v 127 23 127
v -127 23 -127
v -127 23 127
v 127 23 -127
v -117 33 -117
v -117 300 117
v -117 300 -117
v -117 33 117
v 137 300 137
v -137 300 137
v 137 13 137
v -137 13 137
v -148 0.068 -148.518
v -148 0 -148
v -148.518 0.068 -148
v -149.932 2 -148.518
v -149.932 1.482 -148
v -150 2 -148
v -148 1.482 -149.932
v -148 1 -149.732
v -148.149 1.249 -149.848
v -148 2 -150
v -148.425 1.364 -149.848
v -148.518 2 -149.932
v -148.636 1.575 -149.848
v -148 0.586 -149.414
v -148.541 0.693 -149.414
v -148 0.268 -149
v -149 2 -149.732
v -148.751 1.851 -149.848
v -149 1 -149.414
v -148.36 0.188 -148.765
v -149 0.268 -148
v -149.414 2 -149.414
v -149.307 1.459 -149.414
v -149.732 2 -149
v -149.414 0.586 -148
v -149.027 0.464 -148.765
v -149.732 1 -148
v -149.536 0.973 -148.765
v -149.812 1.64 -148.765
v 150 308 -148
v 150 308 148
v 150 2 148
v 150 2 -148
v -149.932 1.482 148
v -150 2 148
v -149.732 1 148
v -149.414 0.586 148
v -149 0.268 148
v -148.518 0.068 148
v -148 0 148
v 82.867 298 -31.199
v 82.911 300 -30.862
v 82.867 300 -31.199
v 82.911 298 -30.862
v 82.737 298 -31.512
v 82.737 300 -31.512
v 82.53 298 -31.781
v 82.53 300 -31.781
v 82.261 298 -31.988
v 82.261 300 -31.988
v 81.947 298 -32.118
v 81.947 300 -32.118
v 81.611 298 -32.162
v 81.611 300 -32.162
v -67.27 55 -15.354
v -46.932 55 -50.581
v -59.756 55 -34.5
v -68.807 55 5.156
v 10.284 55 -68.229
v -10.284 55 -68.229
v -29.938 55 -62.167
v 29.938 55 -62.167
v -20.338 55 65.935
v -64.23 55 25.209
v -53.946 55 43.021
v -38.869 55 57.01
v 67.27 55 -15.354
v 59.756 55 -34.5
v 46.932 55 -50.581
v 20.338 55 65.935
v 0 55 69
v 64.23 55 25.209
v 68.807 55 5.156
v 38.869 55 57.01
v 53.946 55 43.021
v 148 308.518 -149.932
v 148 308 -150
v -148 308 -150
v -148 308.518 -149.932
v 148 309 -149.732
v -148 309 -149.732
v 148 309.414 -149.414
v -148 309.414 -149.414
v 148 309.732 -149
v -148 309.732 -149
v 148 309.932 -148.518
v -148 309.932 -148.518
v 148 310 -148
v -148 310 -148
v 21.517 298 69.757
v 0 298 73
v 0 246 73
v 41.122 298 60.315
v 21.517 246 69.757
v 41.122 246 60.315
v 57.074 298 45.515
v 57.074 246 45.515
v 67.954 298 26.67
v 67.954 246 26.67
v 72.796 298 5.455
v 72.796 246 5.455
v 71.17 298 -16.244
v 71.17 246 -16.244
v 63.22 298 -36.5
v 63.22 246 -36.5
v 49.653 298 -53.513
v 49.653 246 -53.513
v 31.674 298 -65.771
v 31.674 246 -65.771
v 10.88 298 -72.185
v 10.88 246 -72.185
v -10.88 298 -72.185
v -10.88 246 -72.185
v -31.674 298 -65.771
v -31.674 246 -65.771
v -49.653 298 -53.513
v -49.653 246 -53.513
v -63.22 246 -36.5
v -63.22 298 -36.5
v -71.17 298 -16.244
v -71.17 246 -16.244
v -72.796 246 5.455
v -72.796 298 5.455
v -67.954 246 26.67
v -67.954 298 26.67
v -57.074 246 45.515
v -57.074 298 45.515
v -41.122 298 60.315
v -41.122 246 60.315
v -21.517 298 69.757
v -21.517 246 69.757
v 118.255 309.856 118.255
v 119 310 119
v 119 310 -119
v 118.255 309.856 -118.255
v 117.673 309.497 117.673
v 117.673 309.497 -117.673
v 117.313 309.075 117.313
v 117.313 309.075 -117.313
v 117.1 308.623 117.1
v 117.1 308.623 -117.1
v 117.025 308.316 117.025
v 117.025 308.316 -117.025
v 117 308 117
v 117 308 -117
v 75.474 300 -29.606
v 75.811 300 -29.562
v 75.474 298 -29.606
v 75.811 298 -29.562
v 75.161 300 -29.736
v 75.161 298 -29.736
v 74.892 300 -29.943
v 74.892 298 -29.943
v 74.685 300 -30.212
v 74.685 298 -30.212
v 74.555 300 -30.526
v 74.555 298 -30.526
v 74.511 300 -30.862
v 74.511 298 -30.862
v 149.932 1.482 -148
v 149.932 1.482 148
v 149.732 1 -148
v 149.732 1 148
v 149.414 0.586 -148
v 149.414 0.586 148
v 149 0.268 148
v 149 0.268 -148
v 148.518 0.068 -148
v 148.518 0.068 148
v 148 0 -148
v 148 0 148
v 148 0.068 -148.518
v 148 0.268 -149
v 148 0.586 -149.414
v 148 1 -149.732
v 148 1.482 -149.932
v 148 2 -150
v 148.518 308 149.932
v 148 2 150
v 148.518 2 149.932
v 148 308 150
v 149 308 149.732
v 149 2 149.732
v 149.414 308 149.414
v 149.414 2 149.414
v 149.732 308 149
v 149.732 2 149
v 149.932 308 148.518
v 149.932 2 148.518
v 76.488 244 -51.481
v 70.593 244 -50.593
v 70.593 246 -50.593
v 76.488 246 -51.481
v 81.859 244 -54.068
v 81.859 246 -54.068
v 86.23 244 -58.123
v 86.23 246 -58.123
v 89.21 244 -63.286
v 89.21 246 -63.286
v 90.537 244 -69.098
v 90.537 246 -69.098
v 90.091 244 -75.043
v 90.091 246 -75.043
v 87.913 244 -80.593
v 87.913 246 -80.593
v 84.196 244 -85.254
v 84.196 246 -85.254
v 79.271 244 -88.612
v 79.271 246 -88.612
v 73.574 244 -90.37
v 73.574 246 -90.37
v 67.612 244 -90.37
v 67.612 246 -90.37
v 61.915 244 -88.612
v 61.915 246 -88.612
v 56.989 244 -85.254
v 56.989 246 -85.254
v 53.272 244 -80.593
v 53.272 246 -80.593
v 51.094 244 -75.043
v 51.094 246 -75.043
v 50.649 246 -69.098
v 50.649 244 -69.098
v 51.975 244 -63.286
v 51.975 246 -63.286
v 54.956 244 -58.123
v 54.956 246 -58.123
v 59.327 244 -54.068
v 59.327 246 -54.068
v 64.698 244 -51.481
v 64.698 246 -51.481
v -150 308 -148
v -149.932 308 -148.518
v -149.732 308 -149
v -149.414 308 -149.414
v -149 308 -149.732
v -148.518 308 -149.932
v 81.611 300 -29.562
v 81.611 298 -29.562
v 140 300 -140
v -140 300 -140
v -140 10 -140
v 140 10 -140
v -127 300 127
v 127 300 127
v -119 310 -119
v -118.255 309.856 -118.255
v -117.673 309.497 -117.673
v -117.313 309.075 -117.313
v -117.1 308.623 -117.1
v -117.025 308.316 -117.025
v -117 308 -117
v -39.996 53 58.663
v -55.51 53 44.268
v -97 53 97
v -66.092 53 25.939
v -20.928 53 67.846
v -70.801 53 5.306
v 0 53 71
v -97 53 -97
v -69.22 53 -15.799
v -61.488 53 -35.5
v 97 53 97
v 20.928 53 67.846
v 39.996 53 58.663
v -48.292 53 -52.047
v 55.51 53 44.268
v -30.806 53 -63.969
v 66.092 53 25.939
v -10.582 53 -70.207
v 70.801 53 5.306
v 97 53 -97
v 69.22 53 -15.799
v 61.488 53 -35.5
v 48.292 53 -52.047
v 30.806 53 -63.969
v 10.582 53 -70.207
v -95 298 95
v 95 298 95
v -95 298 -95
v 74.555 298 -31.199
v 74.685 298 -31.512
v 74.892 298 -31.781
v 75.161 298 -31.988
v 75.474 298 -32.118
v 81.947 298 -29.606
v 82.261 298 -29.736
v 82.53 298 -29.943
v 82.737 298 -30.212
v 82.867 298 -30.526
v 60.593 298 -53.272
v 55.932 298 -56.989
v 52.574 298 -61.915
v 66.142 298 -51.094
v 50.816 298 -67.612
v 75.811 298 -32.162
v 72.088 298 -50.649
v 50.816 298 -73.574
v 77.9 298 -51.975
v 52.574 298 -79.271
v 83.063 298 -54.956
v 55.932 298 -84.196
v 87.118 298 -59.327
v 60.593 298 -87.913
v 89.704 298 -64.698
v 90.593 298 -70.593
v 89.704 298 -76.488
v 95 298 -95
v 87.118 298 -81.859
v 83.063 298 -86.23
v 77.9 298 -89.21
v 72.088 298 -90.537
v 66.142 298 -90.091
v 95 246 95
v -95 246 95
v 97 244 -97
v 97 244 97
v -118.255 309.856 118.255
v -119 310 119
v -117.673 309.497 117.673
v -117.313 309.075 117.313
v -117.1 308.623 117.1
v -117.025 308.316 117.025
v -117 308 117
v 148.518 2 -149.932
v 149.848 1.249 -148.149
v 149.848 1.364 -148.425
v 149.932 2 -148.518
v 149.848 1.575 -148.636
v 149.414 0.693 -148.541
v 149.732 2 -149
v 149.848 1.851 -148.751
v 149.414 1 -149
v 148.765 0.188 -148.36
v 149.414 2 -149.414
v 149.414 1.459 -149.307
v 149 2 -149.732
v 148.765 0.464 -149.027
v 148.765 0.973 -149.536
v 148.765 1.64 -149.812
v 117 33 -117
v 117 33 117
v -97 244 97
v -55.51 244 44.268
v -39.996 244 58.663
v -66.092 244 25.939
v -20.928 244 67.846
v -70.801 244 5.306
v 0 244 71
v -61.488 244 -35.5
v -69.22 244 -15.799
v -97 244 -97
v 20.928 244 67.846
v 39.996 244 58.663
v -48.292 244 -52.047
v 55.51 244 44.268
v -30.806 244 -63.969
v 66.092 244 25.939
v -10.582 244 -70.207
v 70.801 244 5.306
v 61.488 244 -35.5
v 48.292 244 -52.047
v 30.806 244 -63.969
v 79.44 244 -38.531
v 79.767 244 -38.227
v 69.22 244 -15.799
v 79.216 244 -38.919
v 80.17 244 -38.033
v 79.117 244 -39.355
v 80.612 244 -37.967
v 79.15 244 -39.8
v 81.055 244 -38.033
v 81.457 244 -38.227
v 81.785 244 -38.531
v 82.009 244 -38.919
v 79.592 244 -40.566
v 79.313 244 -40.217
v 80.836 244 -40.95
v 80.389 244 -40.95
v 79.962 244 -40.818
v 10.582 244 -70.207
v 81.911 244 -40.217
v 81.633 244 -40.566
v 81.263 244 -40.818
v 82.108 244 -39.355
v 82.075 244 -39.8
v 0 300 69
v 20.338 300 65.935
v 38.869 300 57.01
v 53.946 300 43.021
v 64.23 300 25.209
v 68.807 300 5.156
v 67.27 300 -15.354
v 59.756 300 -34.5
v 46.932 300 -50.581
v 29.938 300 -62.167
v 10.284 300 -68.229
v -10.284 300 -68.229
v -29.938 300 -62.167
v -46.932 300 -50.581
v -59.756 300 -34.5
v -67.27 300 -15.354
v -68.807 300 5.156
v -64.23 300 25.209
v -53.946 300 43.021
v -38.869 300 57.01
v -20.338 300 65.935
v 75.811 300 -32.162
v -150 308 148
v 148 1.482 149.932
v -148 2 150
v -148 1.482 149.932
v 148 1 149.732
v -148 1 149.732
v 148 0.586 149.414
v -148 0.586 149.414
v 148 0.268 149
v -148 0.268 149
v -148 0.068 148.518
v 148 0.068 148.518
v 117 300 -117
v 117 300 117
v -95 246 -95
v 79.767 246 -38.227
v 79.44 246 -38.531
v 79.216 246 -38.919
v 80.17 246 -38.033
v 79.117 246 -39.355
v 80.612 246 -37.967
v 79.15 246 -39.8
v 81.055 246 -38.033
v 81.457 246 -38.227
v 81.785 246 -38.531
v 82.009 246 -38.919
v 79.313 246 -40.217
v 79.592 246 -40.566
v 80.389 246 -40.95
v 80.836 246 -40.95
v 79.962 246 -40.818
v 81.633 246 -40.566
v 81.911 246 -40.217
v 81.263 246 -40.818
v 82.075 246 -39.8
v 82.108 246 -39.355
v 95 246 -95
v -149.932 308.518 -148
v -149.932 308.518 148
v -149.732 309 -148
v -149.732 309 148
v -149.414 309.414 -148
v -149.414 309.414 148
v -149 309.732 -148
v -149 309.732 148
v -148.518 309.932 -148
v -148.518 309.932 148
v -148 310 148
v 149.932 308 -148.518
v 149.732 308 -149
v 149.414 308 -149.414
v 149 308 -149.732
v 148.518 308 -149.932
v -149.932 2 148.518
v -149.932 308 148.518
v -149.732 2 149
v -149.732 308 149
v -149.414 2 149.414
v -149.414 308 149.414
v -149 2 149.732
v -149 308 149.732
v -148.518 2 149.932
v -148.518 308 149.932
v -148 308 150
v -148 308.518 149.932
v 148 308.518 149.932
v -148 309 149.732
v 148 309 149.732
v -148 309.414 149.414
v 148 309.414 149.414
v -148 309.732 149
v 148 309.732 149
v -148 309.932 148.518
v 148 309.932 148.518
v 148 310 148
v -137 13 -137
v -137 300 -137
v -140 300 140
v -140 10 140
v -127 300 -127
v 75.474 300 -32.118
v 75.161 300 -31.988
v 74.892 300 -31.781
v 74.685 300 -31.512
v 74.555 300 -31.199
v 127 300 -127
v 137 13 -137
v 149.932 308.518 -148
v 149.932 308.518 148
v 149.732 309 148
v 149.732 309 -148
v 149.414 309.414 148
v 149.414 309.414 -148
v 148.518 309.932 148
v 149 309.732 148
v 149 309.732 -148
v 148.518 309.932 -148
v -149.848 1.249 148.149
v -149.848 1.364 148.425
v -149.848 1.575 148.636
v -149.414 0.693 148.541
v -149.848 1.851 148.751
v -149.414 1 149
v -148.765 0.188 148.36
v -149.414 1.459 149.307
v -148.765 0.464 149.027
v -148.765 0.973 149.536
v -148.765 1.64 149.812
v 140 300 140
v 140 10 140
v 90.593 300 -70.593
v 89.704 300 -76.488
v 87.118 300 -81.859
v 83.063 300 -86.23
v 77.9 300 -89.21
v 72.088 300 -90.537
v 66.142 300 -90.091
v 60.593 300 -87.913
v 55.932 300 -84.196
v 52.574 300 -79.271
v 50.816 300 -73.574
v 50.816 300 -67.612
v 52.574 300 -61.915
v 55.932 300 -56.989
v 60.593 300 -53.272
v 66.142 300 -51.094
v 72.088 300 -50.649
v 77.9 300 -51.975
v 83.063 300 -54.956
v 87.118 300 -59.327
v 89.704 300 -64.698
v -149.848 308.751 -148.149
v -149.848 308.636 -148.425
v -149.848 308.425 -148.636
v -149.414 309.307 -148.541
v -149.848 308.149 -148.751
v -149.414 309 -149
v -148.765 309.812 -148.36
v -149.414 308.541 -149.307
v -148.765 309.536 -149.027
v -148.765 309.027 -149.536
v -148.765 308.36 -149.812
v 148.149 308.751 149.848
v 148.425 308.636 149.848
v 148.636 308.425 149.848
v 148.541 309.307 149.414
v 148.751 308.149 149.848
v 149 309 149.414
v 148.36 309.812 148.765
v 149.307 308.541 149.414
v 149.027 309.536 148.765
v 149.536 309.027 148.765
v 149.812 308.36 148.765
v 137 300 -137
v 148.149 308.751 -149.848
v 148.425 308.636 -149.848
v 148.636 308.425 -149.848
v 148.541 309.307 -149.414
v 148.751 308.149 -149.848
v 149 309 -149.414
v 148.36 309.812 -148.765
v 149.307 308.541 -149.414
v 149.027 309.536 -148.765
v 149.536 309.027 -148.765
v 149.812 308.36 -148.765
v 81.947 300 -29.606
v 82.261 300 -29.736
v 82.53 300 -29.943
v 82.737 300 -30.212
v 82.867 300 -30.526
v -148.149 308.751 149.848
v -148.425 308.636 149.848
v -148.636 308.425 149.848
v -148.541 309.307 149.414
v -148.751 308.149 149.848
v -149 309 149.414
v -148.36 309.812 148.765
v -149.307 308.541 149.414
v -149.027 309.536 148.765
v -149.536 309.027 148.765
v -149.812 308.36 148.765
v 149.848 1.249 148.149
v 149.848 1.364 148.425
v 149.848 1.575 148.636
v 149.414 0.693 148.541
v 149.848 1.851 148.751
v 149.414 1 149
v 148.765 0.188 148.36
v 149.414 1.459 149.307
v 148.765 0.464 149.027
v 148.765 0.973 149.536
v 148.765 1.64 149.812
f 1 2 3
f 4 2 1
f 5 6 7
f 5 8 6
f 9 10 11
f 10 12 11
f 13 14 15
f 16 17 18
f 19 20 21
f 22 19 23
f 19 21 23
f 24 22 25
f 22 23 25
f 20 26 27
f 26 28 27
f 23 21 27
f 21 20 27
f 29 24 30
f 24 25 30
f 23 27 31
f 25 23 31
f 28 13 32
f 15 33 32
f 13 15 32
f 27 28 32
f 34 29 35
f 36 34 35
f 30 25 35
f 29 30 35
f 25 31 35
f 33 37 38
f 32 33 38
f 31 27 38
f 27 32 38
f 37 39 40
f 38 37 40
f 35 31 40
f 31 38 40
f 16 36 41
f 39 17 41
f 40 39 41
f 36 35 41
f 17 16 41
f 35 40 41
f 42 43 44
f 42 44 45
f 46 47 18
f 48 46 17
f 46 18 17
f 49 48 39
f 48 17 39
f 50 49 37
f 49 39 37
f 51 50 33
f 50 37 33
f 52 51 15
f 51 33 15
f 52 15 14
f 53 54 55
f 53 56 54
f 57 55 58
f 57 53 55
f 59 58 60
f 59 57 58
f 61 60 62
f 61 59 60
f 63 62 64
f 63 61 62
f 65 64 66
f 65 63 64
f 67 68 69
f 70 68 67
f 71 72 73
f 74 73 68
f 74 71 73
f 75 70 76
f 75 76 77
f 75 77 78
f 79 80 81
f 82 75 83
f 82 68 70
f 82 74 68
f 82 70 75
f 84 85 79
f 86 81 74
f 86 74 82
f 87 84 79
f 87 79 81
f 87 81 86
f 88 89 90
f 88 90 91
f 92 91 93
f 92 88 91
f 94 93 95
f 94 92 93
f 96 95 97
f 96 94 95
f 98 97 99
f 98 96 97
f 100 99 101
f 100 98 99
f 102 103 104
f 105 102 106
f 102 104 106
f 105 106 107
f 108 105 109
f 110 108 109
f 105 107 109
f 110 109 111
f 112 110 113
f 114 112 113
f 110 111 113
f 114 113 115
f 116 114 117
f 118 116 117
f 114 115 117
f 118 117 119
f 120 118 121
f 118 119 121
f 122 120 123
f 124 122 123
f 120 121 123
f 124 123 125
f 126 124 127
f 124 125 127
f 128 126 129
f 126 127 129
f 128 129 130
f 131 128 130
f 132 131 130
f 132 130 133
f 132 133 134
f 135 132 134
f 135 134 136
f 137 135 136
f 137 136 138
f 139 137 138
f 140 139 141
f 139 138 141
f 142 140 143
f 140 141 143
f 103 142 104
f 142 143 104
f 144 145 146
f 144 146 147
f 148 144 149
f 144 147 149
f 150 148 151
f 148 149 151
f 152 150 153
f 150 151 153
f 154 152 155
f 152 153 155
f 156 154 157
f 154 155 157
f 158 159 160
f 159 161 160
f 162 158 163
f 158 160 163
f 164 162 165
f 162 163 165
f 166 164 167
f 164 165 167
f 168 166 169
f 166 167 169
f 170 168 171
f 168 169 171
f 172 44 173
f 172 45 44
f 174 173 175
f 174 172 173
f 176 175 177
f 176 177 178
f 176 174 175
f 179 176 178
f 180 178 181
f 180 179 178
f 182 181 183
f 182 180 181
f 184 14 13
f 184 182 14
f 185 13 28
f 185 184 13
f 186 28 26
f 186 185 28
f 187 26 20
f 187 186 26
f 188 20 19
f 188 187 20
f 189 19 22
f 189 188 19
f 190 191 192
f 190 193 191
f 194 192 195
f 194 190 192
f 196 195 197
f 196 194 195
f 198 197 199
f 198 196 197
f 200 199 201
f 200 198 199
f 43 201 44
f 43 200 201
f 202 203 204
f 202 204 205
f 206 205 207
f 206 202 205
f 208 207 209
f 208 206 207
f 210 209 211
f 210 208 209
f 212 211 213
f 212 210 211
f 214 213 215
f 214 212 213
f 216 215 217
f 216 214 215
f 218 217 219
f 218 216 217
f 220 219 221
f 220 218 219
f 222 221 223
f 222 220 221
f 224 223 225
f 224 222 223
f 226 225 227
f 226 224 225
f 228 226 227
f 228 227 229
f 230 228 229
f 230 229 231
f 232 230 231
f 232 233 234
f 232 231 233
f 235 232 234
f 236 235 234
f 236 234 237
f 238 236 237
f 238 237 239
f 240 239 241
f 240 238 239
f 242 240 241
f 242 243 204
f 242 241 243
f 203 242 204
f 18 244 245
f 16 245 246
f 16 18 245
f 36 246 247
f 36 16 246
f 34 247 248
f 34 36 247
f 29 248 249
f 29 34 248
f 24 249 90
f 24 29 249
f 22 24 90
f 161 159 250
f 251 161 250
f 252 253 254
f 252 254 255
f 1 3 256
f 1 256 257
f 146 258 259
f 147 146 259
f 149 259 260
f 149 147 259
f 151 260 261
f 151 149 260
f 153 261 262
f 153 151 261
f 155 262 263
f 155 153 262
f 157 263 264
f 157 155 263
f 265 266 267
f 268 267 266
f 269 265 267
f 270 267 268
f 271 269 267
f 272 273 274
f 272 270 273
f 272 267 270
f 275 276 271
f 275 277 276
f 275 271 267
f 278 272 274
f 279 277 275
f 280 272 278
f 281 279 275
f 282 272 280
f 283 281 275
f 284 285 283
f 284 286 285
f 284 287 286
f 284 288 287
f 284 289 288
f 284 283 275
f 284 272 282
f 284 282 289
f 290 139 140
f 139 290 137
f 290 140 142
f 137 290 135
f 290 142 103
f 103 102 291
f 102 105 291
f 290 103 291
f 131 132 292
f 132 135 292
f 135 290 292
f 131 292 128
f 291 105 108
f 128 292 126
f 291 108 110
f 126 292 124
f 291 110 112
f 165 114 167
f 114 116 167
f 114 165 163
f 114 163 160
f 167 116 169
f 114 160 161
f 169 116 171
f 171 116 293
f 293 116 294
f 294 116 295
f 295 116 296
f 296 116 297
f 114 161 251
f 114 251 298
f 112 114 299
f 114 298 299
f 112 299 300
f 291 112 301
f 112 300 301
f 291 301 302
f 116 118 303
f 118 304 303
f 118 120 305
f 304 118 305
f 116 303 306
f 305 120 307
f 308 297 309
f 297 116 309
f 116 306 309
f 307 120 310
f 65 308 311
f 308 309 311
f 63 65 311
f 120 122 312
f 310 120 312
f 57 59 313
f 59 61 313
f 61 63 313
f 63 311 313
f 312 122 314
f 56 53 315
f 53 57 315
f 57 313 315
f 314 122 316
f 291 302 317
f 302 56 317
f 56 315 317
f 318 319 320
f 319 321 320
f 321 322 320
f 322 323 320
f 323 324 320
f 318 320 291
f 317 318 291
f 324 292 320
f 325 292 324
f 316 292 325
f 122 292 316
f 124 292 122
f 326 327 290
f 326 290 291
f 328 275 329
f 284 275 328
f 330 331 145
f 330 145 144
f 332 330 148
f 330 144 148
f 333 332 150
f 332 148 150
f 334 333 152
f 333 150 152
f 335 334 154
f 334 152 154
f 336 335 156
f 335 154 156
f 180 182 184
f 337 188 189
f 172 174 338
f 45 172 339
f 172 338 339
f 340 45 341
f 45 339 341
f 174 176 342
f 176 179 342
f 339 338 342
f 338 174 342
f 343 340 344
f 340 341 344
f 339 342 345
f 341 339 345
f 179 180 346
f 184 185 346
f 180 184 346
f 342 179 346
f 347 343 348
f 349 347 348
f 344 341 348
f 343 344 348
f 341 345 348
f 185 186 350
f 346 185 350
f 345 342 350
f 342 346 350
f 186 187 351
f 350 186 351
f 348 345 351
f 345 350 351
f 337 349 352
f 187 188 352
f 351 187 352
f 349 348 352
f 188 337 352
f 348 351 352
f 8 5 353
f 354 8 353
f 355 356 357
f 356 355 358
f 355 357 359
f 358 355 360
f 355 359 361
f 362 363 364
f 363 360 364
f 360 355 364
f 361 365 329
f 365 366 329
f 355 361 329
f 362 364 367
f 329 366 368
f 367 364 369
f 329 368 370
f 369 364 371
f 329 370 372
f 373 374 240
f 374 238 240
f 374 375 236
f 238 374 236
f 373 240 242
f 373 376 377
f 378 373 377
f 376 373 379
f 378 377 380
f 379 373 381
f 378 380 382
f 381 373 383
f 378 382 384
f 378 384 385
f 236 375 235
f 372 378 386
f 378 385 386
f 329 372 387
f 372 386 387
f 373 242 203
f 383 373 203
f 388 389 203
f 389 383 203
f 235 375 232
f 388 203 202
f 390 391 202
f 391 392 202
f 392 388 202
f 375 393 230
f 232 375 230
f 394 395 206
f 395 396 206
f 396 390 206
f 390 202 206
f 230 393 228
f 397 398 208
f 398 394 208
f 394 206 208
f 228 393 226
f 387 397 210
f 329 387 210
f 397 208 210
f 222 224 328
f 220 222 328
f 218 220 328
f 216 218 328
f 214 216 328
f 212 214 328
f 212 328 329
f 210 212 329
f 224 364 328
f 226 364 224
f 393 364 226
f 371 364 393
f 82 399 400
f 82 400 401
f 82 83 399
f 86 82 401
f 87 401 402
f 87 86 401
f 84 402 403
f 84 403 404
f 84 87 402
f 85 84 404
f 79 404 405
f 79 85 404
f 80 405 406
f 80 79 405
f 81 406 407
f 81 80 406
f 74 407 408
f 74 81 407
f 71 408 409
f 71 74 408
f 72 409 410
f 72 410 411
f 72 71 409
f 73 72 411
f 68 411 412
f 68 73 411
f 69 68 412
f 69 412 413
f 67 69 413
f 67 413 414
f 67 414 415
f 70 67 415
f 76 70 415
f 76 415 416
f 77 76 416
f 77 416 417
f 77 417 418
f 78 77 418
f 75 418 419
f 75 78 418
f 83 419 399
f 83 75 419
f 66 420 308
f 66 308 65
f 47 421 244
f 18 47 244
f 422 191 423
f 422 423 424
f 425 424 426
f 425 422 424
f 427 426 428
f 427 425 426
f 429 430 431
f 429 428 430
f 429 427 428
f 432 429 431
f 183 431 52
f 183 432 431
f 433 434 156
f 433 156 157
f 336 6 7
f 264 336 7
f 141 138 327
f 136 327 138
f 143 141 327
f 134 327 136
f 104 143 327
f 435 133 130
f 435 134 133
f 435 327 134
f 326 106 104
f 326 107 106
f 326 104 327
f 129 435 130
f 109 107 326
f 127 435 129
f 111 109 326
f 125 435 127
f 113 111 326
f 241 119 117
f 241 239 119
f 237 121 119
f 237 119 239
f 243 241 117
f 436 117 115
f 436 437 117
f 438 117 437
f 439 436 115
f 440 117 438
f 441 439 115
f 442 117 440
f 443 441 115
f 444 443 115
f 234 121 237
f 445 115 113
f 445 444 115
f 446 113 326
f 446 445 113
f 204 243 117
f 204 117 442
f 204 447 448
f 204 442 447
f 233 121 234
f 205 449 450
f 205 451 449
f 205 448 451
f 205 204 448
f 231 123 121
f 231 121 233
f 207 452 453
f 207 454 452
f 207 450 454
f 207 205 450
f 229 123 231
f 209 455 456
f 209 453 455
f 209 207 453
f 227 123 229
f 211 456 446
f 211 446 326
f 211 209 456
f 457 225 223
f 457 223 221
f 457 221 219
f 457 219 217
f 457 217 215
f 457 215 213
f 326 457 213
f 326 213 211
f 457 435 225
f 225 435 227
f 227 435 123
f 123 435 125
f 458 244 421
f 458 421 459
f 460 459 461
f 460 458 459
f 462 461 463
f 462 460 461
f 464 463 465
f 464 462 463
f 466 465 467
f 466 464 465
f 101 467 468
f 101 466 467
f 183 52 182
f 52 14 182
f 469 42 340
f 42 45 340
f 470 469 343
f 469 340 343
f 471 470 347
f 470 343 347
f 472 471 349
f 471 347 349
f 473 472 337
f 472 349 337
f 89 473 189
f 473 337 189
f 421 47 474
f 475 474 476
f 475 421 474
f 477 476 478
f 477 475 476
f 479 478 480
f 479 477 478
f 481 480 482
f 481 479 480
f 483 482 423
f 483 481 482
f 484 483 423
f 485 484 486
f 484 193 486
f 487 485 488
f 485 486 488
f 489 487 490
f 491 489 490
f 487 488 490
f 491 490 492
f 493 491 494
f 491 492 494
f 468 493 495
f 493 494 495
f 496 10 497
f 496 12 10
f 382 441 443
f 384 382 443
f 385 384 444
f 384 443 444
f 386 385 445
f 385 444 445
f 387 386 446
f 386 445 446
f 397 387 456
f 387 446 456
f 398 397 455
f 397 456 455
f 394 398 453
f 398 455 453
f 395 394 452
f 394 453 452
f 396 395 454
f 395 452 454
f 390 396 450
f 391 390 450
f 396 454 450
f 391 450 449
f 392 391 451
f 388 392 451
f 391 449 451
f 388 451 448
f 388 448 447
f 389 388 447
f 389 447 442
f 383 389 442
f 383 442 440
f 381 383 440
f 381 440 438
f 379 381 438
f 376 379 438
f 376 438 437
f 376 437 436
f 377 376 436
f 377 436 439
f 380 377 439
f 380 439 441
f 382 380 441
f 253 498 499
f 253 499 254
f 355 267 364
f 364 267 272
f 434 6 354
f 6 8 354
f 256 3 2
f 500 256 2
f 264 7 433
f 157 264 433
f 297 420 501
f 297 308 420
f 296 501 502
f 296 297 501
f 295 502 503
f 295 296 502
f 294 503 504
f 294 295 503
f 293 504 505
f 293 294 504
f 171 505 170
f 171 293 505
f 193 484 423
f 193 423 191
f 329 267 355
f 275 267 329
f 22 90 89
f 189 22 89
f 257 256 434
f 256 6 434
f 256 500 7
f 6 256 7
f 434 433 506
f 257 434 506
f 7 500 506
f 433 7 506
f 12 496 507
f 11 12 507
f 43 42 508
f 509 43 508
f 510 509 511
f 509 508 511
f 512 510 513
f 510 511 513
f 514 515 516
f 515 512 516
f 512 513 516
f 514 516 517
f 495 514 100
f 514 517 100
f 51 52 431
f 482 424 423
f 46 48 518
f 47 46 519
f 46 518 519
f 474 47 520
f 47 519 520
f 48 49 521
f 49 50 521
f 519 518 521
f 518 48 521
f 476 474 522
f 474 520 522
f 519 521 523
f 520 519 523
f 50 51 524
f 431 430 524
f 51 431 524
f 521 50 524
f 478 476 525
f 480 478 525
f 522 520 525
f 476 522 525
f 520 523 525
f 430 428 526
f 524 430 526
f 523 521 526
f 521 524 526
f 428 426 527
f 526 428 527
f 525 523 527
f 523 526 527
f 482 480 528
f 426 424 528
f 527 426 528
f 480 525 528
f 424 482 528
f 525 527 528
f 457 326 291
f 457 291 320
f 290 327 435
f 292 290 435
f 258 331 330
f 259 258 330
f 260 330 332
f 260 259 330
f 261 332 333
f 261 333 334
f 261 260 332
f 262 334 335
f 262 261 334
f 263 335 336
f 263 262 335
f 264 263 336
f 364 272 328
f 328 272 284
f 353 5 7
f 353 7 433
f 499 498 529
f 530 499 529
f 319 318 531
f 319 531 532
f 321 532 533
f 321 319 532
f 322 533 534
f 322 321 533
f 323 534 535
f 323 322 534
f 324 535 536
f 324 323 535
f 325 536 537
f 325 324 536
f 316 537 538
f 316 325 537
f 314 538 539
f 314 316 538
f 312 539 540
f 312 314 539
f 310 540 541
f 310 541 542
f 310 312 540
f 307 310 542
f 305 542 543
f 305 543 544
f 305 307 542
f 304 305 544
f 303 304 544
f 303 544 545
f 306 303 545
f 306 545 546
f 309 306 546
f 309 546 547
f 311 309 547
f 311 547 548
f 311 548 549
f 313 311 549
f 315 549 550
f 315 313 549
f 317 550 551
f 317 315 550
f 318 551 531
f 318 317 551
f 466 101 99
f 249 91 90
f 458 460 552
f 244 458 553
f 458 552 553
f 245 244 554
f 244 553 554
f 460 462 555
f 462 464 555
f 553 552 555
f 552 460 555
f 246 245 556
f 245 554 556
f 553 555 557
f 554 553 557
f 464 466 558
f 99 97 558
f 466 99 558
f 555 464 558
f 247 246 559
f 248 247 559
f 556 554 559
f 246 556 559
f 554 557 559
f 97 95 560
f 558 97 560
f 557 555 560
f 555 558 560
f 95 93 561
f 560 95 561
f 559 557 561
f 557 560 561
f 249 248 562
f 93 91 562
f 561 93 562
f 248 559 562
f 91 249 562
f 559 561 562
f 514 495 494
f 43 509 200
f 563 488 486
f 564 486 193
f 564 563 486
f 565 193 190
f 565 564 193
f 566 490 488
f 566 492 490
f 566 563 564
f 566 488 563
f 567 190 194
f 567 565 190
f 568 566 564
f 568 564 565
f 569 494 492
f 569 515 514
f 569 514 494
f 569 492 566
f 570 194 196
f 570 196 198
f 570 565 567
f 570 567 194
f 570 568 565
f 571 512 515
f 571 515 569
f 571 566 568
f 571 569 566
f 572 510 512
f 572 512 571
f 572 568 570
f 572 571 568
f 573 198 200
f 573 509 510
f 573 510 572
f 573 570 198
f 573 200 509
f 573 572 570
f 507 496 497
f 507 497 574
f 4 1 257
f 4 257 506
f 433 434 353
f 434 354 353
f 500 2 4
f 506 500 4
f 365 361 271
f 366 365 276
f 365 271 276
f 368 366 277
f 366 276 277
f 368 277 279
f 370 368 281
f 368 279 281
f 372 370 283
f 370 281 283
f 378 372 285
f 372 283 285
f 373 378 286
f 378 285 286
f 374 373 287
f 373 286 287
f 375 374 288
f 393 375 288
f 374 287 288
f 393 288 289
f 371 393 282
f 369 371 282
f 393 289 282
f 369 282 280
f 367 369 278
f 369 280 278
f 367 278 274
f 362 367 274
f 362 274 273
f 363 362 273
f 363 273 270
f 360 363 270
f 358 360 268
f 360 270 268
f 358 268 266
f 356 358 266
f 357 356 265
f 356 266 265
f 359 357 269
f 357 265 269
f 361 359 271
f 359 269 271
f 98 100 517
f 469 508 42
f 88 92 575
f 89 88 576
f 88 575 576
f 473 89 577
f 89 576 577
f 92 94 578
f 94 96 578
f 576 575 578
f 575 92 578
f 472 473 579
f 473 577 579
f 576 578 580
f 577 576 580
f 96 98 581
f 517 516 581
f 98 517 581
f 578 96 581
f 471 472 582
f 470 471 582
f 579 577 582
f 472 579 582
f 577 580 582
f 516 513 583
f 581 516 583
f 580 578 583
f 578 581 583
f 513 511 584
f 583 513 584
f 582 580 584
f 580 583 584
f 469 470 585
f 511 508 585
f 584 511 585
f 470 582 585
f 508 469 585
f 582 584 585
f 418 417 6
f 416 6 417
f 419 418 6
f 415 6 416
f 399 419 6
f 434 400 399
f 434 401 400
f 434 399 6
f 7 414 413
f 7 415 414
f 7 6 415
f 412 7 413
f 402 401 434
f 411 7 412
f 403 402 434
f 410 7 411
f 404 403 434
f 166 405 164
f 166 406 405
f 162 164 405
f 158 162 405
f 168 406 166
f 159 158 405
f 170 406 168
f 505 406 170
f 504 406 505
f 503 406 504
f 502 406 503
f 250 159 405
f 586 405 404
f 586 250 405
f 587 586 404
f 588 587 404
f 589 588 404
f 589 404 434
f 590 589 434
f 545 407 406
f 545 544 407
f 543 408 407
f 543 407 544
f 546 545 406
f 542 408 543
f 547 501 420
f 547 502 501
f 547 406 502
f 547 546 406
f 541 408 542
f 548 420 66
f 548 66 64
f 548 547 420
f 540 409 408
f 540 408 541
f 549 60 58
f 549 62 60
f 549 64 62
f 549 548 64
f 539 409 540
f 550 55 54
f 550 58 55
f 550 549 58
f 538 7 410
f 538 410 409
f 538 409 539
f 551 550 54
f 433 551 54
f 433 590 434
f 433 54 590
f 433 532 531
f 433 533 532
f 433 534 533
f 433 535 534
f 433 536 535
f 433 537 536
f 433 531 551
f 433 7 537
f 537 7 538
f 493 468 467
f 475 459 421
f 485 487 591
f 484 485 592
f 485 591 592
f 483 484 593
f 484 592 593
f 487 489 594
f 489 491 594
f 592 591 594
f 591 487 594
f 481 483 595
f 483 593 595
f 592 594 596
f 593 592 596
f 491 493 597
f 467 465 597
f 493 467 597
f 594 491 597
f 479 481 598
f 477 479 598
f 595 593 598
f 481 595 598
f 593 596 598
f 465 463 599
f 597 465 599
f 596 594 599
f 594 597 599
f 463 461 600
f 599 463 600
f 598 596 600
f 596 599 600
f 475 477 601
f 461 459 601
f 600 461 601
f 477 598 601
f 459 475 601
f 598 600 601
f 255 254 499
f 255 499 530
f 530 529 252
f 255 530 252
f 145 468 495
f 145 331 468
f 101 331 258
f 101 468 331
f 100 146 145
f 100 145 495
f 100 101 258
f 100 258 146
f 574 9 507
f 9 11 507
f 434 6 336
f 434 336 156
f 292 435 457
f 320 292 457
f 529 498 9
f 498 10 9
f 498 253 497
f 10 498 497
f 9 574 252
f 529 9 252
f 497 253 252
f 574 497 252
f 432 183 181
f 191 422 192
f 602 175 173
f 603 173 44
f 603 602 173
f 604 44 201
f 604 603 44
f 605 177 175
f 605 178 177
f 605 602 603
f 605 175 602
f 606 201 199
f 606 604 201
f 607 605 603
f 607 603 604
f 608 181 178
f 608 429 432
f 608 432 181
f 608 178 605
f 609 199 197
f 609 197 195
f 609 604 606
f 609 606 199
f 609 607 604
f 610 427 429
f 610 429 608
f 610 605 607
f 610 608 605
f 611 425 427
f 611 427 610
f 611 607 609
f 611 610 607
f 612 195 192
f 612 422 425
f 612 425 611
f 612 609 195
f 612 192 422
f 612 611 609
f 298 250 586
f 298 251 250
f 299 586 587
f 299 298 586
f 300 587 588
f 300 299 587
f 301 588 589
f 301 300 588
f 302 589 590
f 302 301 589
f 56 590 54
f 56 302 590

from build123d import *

# Parameters (mm, degrees)
SKETCH2_W               = 300
SKETCH2_H               = 300
BOSS_EXTRUDE1_DEPTH     = 10
SKETCH3_W               = 300
SKETCH3_H               = 300
SKETCH3_W_2             = 280
SKETCH3_H_2             = 280
BOSS_EXTRUDE2_DEPTH     = 290
SKETCH4_W               = 274
SKETCH4_H               = 274
BOSS_EXTRUDE3_DEPTH     = 10
SKETCH5_W               = 274
SKETCH5_H               = 274
SKETCH5_W_2             = 254
SKETCH5_H_2             = 254
BOSS_EXTRUDE4_DEPTH     = 277
SKETCH6_W               = 234
SKETCH6_H               = 234
BOSS_EXTRUDE5_DEPTH     = 20
SKETCH7_W               = 234
SKETCH7_H               = 234
SKETCH7_W_2             = 194
SKETCH7_H_2             = 194
BOSS_EXTRUDE6_DEPTH     = 247
SKETCH8_R               = 71
BOSS_EXTRUDE7_DEPTH     = 2
SKETCH9_R               = 71
SKETCH9_R_2             = 69
BOSS_EXTRUDE8_DEPTH     = 245
SKETCH10_W              = 194
SKETCH10_H              = 194
SKETCH10_R              = 71
BOSS_EXTRUDE9_DEPTH     = 2
SKETCH11_W              = 194
SKETCH11_H              = 194
SKETCH11_W_2            = 190
SKETCH11_H_2            = 190
BOSS_EXTRUDE11_DEPTH    = 52
CUT_EXTRUDE1_DEPTH      = 200
CUT_EXTRUDE1_DEPTH_BACK = 52
SKETCH12_R              = 20
SKETCH16_R              = 73
SKETCH16_R_2            = 71
BOSS_EXTRUDE14_DEPTH    = 52
SKETCH17_W              = 194
SKETCH17_H              = 194
SKETCH17_R              = 69
BOSS_EXTRUDE15_DEPTH    = 2
SKETCH18_W              = 300
SKETCH18_H              = 300
SKETCH18_W_2            = 234
SKETCH18_H_2            = 234
BOSS_EXTRUDE16_DEPTH    = 10
FILLET1_R               = 2
CUT_EXTRUDE6_START      = 298
CUT_EXTRUDE6_OUTLINE_R  = 20
CUT_EXTRUDE6_DEPTH      = 2
SKETCH21_R              = 1.5
CUT_EXTRUDE7_DEPTH      = 10
SKETCH22_W              = 8.4
SKETCH22_H              = 2.6
CUT_EXTRUDE8_DEPTH      = 10
FILLET2_R               = 1.3


# Read off the part's stored shape, not the designer's step: Cut-Extrude6
with BuildPart() as part:
    # Sketch2 → Boss-Extrude1 (new body)
    with BuildSketch(Plane(origin=(0, 0, 0), x_dir=(1, 0, 0), z_dir=(0, 1, 0))):
        Rectangle(SKETCH2_W, SKETCH2_H)
    extrude(amount=BOSS_EXTRUDE1_DEPTH)

    # Sketch3 → Boss-Extrude2 (add)
    with BuildSketch(Plane(origin=(0, 10, 0), x_dir=(1, 0, 0), z_dir=(0, 1, 0))):
        Rectangle(SKETCH3_W, SKETCH3_H)
        Rectangle(SKETCH3_W_2, SKETCH3_H_2, mode=Mode.SUBTRACT)
    extrude(amount=BOSS_EXTRUDE2_DEPTH)



with BuildPart() as body_2:
    # Sketch4 → Boss-Extrude3 (new body)
    with BuildSketch(Plane(origin=(0, 13, 0), x_dir=(1, 0, 0), z_dir=(0, 1, 0))):
        Rectangle(SKETCH4_W, SKETCH4_H)
    extrude(amount=BOSS_EXTRUDE3_DEPTH)

    # Sketch5 → Boss-Extrude4 (add)
    with BuildSketch(Plane(origin=(0, 23, 0), x_dir=(1, 0, 0), z_dir=(0, 1, 0))):
        Rectangle(SKETCH5_W, SKETCH5_H)
        Rectangle(SKETCH5_W_2, SKETCH5_H_2, mode=Mode.SUBTRACT)
    extrude(amount=BOSS_EXTRUDE4_DEPTH)


with BuildPart() as body_3:
    # Sketch6 → Boss-Extrude5 (new body)
    with BuildSketch(Plane(origin=(0, 33, 0), x_dir=(1, 0, 0), z_dir=(0, 1, 0))):
        Rectangle(SKETCH6_W, SKETCH6_H)
    extrude(amount=BOSS_EXTRUDE5_DEPTH)

    # Sketch7 → Boss-Extrude6 (add)
    with BuildSketch(Plane(origin=(0, 53, 0), x_dir=(1, 0, 0), z_dir=(0, 1, 0))):
        Rectangle(SKETCH7_W, SKETCH7_H)
        Rectangle(SKETCH7_W_2, SKETCH7_H_2, mode=Mode.SUBTRACT)
    extrude(amount=BOSS_EXTRUDE6_DEPTH)

    # Sketch8 → Boss-Extrude7 (add)
    with BuildSketch(Plane(origin=(0, 53, 0), x_dir=(1, 0, 0), z_dir=(0, 1, 0))):
        with Locations(Location((0, 0, 0), (0, 0, 270))):
            Circle(SKETCH8_R)
    extrude(amount=BOSS_EXTRUDE7_DEPTH)

    # Sketch9 → Boss-Extrude8 (add)
    with BuildSketch(Plane(origin=(0, 55, 0), x_dir=(1, 0, 0), z_dir=(0, 1, 0))):
        with Locations(Location((0, 0, 0), (0, 0, 270))):
            Circle(SKETCH9_R)
        with Locations(Location((0, 0, 0), (0, 0, 270))):
            Circle(SKETCH9_R_2, mode=Mode.SUBTRACT)
    extrude(amount=BOSS_EXTRUDE8_DEPTH)

    # Sketch10 → Boss-Extrude9 (add)
    with BuildSketch(Plane(origin=(0, 244, 0), x_dir=(1, 0, 0), z_dir=(0, 1, 0))):
        Rectangle(SKETCH10_W, SKETCH10_H)
        with Locations(Location((0, 0, 0), (0, 0, 270))):
            Circle(SKETCH10_R, mode=Mode.SUBTRACT)
    extrude(amount=BOSS_EXTRUDE9_DEPTH)

    # Sketch11 → Boss-Extrude11 (add)
    with BuildSketch(Plane(origin=(0, 246, 0), x_dir=(1, 0, 0), z_dir=(0, 1, 0))):
        Rectangle(SKETCH11_W, SKETCH11_H)
        Rectangle(SKETCH11_W_2, SKETCH11_H_2, mode=Mode.SUBTRACT)
    extrude(amount=BOSS_EXTRUDE11_DEPTH)

    # Sketch12 → Cut-Extrude1 (cut, two sides: drawn at the far end of the back side and taken through both)
    with BuildSketch(Plane(origin=(0, 246, 0), x_dir=(1, 0, 0), z_dir=(0, 1, 0)).offset(-CUT_EXTRUDE1_DEPTH_BACK)):
        with Locations(Location((70.592917245, 70.592917245, 0), (0, 0, 270))):
            Circle(SKETCH12_R)
    extrude(amount=CUT_EXTRUDE1_DEPTH + CUT_EXTRUDE1_DEPTH_BACK, mode=Mode.SUBTRACT)

    # Sketch16 → Boss-Extrude14 (add)
    with BuildSketch(Plane(origin=(0, 246, 0), x_dir=(1, 0, 0), z_dir=(0, 1, 0))):
        with Locations(Location((0, 0, 0), (0, 0, 270))):
            Circle(SKETCH16_R)
        with Locations(Location((0, 0, 0), (0, 0, 270))):
            Circle(SKETCH16_R_2, mode=Mode.SUBTRACT)
    extrude(amount=BOSS_EXTRUDE14_DEPTH)

    # Sketch17 → Boss-Extrude15 (add)
    with BuildSketch(Plane(origin=(0, 298, 0), x_dir=(1, 0, 0), z_dir=(0, 1, 0))):
        Rectangle(SKETCH17_W, SKETCH17_H)
        with Locations(Location((0, 0, 0), (0, 0, 270))):
            Circle(SKETCH17_R, mode=Mode.SUBTRACT)
    extrude(amount=BOSS_EXTRUDE15_DEPTH)

    # Cut-Extrude6 outline → Cut-Extrude6 (cut)
    with BuildSketch(Plane(origin=(0, 0, 0), x_dir=(1, 0, 0), z_dir=(0, 1, 0)).offset(CUT_EXTRUDE6_START)):
        with Locations((70.592917245, 70.592917245)):
            Circle(CUT_EXTRUDE6_OUTLINE_R)
    extrude(amount=CUT_EXTRUDE6_DEPTH, mode=Mode.SUBTRACT)

    # Sketch21 → Cut-Extrude7 (cut)
    with BuildSketch(Plane(origin=(0, 246, 0), x_dir=(1, 0, 0), z_dir=(0, 1, 0))):
        with Locations(Location((80.612449639, 39.466675366, 0), (0, 0, 270))):
            Circle(SKETCH21_R)
    extrude(amount=-CUT_EXTRUDE7_DEPTH, mode=Mode.SUBTRACT)

    # Sketch22 → Cut-Extrude8 (cut)
    with BuildSketch(Plane(origin=(0, 300, 0), x_dir=(1, 0, 0), z_dir=(0, 1, 0))):
        with Locations((78.71084614, 30.862042528)):
            Rectangle(SKETCH22_W, SKETCH22_H)
    extrude(amount=-CUT_EXTRUDE8_DEPTH, mode=Mode.SUBTRACT)

    # Fillet2
    fillet2_edges = [body_3.edges().sort_by_distance(p)[0] for p in [
        (82.91084614, 299, -29.562042528),
        (74.51084614, 299, -29.562042528),
        (74.51084614, 299, -32.162042528),
        (82.91084614, 299, -32.162042528),
    ]]
    fillet(fillet2_edges, radius=FILLET2_R - 0.0001)  # a hair under: the kernel refuses the full size


with BuildPart() as part_1:
    add(part.part)

    add(body_2.part)  # Boss-Extrude16 merges body 2
    # Sketch18 → Boss-Extrude16 (add)
    with BuildSketch(Plane(origin=(0, 300, 0), x_dir=(1, 0, 0), z_dir=(0, 1, 0))):
        Rectangle(SKETCH18_W, SKETCH18_H)
        Rectangle(SKETCH18_W_2, SKETCH18_H_2, mode=Mode.SUBTRACT)
    extrude(amount=BOSS_EXTRUDE16_DEPTH)

    # Fillet1
    fillet1_edges = [part_1.edges().sort_by_distance(p)[0] for p in [
        (150, 310, 0),
        (0, 310, -150),
        (-150, 310, 0),
        (0, 310, 150),
        (117, 310, 0),
        (0, 310, -117),
        (-117, 310, 0),
        (0, 310, 117),
        (0, 0, 150),
        (-150, 0, 0),
        (0, 0, -150),
        (150, 0, 0),
        (150, 155, 150),
        (-150, 155, 150),
        (-150, 155, -150),
        (150, 155, -150),
    ]]
    fillet(fillet1_edges, radius=FILLET1_R)


solid = Compound([body_3.part, part_1.part])
